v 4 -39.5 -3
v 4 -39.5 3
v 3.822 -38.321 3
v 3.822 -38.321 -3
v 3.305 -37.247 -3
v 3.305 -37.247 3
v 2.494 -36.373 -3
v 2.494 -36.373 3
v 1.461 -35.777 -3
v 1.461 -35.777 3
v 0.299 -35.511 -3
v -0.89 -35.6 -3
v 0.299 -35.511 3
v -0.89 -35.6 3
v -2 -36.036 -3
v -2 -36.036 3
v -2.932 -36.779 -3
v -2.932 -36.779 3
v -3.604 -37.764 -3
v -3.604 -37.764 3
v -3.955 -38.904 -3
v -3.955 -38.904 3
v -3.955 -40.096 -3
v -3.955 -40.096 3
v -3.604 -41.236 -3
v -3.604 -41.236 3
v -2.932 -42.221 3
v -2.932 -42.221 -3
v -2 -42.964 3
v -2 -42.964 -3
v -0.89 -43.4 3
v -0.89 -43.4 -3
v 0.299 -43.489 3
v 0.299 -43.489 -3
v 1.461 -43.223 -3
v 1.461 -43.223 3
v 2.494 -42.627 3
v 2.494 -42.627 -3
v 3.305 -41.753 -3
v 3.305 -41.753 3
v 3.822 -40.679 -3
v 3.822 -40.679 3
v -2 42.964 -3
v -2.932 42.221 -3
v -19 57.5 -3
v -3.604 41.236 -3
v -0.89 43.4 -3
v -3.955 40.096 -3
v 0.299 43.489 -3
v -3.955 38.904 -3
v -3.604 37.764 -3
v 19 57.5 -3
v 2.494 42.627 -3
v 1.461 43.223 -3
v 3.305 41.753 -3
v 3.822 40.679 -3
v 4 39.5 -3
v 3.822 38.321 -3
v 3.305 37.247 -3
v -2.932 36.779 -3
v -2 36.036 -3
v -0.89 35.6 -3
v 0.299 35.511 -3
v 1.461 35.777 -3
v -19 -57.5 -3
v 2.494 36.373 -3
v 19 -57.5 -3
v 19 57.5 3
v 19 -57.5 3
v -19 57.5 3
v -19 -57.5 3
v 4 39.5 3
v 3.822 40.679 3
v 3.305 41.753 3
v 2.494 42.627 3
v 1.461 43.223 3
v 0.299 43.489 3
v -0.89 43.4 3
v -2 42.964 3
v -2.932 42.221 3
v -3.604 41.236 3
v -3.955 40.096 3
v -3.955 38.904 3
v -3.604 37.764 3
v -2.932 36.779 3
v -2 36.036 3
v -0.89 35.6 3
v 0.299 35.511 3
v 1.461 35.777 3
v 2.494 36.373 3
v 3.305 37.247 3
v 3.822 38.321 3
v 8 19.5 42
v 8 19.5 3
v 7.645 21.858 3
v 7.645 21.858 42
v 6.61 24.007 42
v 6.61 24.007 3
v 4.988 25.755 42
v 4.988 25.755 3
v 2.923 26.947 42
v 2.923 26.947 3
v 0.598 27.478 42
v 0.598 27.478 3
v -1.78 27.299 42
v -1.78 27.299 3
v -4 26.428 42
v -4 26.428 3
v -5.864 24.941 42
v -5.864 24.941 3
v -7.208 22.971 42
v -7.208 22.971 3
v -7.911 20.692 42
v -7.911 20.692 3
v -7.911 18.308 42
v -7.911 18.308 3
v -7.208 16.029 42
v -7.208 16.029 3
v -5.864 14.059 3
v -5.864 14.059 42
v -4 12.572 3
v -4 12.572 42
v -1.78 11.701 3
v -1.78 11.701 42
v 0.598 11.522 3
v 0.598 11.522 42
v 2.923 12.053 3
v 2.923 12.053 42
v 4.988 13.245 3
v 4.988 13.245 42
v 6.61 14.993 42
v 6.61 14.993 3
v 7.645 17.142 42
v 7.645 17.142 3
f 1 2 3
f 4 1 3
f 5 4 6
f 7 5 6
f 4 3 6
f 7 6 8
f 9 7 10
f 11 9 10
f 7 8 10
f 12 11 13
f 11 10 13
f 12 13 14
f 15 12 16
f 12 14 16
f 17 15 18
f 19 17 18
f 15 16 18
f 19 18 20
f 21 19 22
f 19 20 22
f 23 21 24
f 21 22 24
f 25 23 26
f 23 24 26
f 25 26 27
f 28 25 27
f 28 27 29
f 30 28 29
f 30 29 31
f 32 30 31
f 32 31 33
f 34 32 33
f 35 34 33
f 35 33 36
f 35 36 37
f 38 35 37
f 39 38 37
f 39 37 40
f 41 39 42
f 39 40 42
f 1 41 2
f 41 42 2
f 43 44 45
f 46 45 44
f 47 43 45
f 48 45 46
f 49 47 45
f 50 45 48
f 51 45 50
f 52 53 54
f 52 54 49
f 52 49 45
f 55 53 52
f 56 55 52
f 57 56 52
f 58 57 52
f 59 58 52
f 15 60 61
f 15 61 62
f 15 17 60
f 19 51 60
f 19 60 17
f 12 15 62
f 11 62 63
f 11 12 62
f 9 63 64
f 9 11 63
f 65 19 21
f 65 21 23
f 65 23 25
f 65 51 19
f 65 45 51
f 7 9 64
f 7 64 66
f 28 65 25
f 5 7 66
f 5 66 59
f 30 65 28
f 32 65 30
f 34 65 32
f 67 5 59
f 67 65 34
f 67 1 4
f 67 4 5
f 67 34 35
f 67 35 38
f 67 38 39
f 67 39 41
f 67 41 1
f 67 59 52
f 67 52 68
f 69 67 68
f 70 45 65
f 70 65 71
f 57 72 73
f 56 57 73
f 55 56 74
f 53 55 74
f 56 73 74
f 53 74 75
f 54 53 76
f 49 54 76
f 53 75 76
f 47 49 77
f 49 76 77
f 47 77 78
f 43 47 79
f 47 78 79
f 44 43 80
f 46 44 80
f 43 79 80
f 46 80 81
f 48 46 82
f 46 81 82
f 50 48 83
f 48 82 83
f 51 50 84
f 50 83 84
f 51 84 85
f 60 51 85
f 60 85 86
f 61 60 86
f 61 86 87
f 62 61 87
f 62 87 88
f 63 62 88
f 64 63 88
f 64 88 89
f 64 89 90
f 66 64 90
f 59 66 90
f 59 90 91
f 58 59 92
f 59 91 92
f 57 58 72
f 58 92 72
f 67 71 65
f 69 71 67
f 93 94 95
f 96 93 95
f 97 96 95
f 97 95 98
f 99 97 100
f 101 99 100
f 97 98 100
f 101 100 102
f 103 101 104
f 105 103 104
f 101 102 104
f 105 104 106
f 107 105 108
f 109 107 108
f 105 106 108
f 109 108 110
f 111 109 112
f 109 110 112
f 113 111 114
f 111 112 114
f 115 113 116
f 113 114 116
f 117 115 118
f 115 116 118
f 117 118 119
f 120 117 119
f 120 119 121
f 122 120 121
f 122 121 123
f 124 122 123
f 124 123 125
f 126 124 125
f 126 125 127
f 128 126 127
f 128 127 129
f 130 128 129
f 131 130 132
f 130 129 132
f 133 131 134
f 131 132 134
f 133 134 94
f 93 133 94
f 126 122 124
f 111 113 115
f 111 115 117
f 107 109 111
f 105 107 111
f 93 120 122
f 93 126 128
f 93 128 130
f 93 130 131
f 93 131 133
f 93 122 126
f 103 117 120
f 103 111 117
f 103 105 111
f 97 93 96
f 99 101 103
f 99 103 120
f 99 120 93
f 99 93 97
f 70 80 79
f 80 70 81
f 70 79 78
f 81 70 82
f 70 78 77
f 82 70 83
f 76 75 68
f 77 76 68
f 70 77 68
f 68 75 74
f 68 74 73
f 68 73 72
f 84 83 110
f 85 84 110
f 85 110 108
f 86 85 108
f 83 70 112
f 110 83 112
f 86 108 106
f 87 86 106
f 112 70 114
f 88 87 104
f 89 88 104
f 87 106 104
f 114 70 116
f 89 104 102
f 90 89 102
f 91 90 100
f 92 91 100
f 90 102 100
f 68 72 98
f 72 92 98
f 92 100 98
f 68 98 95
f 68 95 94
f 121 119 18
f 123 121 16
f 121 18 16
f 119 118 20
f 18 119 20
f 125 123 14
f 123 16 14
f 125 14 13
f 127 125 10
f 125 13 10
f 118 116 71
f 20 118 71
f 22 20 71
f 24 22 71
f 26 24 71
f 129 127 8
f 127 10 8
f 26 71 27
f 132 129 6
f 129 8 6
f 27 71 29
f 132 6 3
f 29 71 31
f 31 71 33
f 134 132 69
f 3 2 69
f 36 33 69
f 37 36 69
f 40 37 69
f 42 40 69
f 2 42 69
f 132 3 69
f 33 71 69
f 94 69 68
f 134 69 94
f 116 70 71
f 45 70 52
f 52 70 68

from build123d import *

# Parameters (mm, degrees)
F0_W          = 38
F0_H          = 6
F1_DEPTH      = 57.5
F1_DEPTH_BACK = 57.5
F2_R          = 4
F3_DEPTH      = 6
F4_R          = 8
F5_DEPTH      = 39


with BuildPart() as f1:
    # F0 (on Front) → F1 (new body, two sides)
    with BuildSketch(Plane.XZ) as f1_sk:
        Rectangle(F0_W, F0_H)
    extrude(amount=F1_DEPTH)
    extrude(f1_sk.sketch, amount=-F1_DEPTH_BACK)

    # F2 (on face) → F3 (cut)
    with BuildSketch(Plane.XY.offset(3)):
        with Locations((0, 39.5)):
            Circle(F2_R)
        with Locations((0, -39.5)):
            Circle(F2_R)
    extrude(amount=-F3_DEPTH, mode=Mode.SUBTRACT)

    # F4 (on face) → F5 (join)
    with BuildSketch(Plane.XY.offset(3)):
        with Locations((0, 19.5)):
            Circle(F4_R)
    extrude(amount=F5_DEPTH)


solid = f1.part
